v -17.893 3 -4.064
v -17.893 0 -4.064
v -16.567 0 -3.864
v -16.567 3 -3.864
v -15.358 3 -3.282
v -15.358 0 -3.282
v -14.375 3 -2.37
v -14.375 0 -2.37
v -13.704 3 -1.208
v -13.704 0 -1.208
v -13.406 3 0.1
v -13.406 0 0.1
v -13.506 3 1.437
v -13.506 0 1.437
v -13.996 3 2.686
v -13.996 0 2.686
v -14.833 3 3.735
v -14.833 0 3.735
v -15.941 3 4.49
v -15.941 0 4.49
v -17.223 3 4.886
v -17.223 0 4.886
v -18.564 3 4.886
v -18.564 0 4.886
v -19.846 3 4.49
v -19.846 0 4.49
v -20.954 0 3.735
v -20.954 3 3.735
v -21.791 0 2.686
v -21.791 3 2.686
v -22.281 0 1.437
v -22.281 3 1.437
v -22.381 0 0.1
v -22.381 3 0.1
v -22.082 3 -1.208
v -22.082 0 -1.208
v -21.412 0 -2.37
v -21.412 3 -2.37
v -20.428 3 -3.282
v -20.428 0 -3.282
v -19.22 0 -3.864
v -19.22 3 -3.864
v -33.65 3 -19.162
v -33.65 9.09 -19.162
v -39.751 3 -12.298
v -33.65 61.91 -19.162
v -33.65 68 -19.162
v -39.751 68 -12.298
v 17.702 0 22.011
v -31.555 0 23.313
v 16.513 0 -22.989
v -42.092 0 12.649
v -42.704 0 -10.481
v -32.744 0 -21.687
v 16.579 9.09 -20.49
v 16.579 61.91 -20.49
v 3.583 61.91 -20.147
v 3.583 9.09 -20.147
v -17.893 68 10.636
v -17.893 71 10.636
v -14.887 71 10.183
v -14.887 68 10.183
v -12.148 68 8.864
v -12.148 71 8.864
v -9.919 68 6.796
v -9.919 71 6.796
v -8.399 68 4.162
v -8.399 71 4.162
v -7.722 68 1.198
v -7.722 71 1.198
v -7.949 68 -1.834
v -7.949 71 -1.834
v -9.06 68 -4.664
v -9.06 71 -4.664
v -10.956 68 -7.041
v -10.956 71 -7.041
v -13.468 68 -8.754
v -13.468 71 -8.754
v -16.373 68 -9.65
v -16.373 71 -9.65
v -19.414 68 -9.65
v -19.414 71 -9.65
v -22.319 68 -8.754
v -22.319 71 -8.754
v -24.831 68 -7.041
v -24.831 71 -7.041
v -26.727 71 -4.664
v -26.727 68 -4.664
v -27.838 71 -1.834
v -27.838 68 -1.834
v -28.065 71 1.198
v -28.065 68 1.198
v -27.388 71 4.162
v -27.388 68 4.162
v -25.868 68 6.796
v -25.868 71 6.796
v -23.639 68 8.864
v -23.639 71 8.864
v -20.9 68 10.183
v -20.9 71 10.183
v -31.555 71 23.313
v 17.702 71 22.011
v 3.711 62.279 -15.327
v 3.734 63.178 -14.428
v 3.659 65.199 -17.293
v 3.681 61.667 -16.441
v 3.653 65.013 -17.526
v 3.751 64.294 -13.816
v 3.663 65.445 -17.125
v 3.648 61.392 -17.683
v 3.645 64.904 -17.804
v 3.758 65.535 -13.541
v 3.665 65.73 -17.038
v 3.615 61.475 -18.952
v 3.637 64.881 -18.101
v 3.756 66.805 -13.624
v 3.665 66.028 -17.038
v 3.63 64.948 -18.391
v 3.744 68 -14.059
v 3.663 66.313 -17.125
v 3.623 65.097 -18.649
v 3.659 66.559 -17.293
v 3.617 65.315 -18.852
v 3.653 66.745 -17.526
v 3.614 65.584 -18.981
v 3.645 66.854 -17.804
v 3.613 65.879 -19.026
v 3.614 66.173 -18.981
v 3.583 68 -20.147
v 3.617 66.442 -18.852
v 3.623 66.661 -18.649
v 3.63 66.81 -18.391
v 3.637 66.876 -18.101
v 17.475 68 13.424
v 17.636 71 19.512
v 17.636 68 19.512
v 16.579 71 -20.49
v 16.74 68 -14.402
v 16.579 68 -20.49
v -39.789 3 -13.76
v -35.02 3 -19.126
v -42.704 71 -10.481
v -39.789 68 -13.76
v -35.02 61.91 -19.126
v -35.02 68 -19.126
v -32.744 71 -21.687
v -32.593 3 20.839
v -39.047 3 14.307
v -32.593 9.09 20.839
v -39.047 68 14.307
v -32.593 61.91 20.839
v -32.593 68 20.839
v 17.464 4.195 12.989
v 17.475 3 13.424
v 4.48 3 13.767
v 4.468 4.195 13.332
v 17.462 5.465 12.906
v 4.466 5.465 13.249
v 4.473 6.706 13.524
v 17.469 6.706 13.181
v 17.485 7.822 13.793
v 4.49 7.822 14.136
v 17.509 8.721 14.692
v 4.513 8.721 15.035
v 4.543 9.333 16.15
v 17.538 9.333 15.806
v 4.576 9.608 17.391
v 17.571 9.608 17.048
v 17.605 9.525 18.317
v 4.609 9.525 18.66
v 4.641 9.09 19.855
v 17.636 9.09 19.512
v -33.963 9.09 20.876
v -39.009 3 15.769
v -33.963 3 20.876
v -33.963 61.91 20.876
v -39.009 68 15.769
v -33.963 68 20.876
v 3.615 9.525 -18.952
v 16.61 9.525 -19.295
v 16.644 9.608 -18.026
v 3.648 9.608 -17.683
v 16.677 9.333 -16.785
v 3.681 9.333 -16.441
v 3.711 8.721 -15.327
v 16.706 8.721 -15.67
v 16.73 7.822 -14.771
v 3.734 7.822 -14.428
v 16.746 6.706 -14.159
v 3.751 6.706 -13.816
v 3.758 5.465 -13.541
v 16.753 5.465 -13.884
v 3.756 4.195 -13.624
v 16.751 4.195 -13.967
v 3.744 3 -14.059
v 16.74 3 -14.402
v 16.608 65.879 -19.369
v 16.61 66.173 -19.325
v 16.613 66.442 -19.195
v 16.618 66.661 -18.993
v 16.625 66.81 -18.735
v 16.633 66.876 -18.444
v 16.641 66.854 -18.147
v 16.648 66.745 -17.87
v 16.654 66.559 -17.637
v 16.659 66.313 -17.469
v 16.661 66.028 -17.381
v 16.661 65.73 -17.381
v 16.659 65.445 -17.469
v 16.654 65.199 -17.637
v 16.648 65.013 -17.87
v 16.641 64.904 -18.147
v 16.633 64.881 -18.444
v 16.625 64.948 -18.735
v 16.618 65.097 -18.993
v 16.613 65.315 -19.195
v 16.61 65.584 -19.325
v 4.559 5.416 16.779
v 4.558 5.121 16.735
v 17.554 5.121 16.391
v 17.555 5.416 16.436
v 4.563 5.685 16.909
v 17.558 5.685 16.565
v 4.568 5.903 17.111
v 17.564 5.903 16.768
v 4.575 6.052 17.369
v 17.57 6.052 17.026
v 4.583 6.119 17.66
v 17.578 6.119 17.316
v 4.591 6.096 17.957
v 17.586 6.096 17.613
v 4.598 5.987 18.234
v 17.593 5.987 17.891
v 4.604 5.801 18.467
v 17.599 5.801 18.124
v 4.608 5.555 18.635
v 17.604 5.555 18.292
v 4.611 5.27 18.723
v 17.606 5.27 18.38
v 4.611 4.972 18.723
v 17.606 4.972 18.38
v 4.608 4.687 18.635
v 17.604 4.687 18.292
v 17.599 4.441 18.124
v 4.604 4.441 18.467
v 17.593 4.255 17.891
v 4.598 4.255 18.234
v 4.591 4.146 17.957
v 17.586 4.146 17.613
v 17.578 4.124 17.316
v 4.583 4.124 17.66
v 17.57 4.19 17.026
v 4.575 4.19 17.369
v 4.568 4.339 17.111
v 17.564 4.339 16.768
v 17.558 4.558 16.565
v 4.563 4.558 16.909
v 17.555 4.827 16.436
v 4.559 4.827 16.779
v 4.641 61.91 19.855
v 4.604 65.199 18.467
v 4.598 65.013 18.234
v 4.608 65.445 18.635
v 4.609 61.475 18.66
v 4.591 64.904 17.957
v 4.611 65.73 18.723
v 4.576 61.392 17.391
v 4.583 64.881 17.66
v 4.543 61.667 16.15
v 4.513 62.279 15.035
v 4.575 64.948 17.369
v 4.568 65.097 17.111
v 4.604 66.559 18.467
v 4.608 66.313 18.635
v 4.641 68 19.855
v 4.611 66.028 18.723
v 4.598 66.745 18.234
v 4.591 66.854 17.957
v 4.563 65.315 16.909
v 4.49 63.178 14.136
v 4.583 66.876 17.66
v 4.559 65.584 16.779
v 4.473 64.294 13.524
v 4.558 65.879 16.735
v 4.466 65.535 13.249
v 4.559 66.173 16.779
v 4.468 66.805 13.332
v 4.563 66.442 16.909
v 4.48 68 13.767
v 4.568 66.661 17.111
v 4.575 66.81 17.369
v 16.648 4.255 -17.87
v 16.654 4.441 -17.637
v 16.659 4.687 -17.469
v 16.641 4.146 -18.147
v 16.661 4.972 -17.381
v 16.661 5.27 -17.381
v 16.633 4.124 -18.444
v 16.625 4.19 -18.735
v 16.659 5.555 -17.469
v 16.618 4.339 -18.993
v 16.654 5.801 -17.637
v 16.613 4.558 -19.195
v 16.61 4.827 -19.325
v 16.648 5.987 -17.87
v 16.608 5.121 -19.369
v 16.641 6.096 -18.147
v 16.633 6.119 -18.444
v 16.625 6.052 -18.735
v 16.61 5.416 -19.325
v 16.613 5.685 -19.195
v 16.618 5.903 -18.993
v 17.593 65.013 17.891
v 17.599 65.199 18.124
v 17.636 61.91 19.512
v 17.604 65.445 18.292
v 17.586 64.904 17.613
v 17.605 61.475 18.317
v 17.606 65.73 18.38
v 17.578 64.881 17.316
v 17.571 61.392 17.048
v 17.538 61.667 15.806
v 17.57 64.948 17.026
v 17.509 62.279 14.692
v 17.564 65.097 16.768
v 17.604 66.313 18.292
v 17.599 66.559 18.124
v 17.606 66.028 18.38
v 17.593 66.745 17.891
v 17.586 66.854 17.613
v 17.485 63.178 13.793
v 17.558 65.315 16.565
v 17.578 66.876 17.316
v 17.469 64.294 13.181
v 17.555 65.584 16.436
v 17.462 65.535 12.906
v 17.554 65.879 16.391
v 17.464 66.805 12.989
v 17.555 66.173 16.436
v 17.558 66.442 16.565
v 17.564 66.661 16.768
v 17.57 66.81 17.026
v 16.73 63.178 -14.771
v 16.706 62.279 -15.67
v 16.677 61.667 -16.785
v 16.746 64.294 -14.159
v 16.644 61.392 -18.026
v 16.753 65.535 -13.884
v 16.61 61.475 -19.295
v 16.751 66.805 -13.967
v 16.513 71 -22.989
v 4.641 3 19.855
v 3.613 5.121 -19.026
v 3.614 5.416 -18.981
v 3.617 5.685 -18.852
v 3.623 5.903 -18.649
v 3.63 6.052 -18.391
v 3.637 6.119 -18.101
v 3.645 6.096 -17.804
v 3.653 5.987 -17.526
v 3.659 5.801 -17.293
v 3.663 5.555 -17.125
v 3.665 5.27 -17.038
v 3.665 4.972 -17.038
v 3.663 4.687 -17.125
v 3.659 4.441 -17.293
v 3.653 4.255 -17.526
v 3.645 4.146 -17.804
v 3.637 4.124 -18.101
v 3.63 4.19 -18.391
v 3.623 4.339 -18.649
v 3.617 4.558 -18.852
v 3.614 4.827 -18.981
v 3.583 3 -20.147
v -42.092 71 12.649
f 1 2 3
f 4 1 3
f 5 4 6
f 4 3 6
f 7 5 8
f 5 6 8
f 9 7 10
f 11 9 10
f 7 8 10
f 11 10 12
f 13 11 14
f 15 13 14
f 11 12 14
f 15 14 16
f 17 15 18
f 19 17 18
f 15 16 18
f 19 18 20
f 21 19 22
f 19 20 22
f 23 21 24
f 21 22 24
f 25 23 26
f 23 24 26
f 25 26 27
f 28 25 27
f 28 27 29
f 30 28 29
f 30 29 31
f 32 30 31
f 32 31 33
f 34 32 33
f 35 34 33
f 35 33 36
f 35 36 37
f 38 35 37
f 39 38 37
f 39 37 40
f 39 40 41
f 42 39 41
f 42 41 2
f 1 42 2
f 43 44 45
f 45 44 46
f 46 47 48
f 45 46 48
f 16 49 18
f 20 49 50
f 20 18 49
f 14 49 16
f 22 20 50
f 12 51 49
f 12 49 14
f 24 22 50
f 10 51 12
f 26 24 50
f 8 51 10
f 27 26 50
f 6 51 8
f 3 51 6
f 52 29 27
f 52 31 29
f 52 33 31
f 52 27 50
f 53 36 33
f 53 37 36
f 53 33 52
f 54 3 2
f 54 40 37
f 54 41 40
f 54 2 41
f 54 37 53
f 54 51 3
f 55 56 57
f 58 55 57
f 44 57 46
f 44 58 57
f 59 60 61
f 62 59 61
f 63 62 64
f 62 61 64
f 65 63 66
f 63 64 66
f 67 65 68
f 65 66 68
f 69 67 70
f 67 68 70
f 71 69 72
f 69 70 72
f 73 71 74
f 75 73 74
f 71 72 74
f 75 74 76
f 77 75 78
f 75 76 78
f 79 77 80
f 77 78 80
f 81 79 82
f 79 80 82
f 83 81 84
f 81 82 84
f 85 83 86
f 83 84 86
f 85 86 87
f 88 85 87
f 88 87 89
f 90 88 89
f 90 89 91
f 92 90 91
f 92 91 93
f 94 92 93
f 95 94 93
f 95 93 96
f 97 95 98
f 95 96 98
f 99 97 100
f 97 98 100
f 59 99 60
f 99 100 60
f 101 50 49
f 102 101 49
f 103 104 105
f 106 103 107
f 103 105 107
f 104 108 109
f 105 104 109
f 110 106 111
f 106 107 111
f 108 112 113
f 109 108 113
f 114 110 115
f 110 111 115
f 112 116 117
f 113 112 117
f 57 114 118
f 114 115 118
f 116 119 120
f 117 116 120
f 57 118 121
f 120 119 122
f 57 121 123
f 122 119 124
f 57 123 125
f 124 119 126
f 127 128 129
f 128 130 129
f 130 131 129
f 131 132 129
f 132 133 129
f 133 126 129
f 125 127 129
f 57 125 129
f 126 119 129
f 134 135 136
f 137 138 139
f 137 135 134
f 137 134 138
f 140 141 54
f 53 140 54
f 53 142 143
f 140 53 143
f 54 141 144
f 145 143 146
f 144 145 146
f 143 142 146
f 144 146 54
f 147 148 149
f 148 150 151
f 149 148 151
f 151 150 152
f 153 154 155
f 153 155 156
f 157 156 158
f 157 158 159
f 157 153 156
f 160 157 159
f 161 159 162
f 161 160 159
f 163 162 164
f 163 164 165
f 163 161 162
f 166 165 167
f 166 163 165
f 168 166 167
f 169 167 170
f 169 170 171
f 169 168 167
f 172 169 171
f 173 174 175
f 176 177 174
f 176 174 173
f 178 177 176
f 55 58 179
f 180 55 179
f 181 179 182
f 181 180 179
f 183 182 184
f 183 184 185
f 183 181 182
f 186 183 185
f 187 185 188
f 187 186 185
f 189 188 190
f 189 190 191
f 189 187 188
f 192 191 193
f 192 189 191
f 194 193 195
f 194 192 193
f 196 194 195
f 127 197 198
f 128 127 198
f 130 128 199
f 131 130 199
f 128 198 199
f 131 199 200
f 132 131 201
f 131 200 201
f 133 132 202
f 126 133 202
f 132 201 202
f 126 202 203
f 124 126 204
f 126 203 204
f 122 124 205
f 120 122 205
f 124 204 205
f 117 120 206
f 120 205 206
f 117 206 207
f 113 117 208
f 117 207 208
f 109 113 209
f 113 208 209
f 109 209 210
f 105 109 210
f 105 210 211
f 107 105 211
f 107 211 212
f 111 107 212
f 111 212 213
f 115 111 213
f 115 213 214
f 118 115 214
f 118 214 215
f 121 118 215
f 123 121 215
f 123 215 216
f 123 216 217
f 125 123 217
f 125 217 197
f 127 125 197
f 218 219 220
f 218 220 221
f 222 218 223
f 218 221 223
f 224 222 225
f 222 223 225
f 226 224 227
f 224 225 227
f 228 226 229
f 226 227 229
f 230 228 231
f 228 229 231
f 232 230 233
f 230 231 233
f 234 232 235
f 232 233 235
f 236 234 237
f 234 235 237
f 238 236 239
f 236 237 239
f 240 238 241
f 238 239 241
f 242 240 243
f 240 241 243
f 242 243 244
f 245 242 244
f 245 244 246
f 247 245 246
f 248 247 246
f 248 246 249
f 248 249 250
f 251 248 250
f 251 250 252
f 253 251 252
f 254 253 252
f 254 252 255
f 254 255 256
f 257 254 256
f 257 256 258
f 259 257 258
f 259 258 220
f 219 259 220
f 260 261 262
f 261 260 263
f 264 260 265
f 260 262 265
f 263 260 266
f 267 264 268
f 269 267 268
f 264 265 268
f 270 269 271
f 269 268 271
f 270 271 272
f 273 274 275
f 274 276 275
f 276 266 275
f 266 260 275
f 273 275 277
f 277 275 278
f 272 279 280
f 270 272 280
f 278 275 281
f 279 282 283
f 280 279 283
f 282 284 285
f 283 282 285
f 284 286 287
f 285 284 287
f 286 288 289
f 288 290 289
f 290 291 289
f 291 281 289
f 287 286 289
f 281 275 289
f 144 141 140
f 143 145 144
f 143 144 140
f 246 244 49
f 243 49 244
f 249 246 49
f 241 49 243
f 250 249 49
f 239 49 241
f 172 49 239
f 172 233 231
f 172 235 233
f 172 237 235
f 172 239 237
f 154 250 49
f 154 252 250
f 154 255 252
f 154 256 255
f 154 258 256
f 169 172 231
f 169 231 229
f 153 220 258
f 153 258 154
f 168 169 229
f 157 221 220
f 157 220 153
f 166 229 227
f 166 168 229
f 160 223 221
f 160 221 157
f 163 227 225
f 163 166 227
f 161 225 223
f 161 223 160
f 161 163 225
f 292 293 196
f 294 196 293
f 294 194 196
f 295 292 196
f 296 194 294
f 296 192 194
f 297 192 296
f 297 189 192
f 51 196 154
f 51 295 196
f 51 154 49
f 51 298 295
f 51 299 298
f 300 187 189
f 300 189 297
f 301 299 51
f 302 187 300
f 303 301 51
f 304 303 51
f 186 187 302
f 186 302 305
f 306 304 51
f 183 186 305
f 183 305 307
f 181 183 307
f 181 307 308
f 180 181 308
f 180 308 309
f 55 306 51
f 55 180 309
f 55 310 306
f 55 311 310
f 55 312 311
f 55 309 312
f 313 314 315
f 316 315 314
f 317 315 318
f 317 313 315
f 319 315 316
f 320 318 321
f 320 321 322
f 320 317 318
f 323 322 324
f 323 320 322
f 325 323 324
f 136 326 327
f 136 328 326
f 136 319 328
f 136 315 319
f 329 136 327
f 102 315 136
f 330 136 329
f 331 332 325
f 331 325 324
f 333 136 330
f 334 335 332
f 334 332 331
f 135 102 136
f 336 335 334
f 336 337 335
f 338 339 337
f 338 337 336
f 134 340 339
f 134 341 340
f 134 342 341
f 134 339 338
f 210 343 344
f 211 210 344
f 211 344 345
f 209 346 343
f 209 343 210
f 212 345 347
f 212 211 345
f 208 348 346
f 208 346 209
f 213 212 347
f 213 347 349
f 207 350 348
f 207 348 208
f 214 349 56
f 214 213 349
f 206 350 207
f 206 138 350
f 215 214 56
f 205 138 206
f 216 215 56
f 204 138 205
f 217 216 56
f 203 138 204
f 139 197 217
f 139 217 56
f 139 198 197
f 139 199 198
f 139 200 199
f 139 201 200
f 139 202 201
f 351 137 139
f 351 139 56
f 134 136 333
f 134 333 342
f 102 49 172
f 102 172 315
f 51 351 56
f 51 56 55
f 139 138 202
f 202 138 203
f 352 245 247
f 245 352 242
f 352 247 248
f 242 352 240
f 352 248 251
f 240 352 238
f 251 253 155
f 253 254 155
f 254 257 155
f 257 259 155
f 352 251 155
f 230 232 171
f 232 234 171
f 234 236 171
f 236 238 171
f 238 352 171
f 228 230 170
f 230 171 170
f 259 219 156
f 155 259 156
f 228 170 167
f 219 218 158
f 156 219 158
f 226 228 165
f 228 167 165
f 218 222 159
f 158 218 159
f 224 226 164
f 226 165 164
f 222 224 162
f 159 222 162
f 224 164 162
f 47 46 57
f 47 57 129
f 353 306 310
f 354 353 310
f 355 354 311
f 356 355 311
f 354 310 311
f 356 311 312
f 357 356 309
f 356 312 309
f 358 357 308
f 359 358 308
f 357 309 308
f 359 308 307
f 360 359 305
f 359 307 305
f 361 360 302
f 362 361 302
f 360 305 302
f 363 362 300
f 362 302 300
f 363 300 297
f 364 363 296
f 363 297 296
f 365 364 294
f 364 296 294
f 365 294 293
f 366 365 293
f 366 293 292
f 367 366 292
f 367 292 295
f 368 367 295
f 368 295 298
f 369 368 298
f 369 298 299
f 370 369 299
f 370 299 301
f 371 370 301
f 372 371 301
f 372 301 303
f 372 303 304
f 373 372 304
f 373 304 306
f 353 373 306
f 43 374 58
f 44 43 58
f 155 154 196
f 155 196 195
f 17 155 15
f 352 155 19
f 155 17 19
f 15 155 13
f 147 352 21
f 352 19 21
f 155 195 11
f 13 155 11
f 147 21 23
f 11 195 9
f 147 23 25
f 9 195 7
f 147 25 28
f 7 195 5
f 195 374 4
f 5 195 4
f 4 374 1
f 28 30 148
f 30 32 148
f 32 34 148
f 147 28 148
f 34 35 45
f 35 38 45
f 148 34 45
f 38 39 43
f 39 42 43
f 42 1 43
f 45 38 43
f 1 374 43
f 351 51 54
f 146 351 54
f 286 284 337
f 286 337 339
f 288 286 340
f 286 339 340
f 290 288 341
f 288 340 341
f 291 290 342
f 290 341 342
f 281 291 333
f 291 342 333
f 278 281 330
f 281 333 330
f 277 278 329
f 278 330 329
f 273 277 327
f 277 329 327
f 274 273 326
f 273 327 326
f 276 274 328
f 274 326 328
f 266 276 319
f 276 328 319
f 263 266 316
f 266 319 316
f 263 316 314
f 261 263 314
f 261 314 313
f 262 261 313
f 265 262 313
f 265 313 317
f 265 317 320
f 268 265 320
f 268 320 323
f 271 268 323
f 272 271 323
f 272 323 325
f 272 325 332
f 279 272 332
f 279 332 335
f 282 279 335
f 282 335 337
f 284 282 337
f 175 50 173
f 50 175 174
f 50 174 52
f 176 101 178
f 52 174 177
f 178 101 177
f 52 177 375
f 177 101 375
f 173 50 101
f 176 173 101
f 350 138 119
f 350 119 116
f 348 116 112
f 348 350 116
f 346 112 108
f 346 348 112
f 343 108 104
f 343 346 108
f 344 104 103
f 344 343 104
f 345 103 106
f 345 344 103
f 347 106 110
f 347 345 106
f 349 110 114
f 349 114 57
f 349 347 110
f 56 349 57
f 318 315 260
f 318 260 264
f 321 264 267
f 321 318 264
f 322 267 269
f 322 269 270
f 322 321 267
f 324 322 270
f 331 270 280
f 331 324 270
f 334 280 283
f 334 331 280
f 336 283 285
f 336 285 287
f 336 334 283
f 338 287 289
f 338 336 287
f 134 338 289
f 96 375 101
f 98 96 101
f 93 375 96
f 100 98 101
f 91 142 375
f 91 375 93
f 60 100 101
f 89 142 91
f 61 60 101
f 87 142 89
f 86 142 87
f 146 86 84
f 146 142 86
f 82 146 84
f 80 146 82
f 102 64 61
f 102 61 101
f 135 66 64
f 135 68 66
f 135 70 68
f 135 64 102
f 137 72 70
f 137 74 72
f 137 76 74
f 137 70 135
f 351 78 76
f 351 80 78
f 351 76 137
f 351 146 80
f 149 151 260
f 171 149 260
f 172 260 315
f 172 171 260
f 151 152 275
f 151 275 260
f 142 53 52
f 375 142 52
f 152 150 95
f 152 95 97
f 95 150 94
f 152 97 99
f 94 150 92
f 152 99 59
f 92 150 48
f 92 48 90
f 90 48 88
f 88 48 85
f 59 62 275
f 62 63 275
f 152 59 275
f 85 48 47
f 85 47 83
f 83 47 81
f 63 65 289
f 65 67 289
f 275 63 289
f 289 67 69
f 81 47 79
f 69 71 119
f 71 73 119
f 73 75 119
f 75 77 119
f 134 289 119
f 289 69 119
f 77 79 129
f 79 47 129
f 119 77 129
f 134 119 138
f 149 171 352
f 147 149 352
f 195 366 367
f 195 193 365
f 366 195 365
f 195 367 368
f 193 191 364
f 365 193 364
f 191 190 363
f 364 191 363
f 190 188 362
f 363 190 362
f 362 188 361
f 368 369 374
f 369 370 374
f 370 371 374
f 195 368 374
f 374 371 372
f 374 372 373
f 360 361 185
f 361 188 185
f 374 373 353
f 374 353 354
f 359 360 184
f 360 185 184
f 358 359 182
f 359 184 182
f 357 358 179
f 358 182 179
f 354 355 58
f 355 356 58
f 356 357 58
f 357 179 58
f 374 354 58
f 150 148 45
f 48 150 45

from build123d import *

# Parameters (mm, degrees)
SKETCH1_R                        = 4.951729289
BOSS_EXTRUDE3_DEPTH              = 3
BOSS_EXTRUDE4_DEPTH              = 68
SKETCH5_R                        = 4.5
CUT_EXTRUDE1_DEPTH               = 68
SKETCH11_W                       = 45.01572081
SKETCH11_H                       = 71
CUT_EXTRUDE3_DEPTH               = 2.5
SKETCH12_R                       = 13
BOSS_EXTRUDE7_DEPTH              = 3
SKETCH13_W                       = 45.01572081
SKETCH13_H                       = 71
CUT_EXTRUDE4_DEPTH               = 13
SKETCH14_W                       = 45.01572081
SKETCH14_H                       = 71
BOSS_EXTRUDE8_DEPTH              = 3
SKETCH15_R                       = 1.5
BOSS_EXTRUDE11_DEPTH             = 56.52620135
SKETCH16_R                       = 9
SKETCH16_R_2                     = 4.15
BOSS_EXTRUDE12_DEPTH             = 2
BOSS_EXTRUDE12_DIRECTION_2_REACH = 85.837
SKETCH17_R                       = 9
SKETCH17_R_2                     = 1
BOSS_EXTRUDE13_DEPTH             = 2
SKETCH18_R                       = 13
SKETCH18_R_2                     = 1
BOSS_EXTRUDE14_DEPTH             = 3
SKETCH19_R                       = 1.5
SKETCH19_R_2                     = 1
BOSS_EXTRUDE15_DEPTH             = 56.52620135
CUT_EXTRUDE9_DEPTH               = 43.52620135
SKETCH27_R                       = 10
SKETCH27_R_2                     = 1
CUT_EXTRUDE12_DEPTH              = 10
SKETCH28_R                       = 4.15
CUT_EXTRUDE13_DEPTH              = 73
SKETCH29_R                       = 4.5
SKETCH29_R_2                     = 4.15
CUT_EXTRUDE14_DEPTH              = 73
SKETCH30_R                       = 9
CUT_EXTRUDE15_DEPTH              = 4
SKETCH31_R                       = 10.2
CUT_EXTRUDE17_DEPTH              = 3
CUT_EXTRUDE18_DEPTH              = 197
SKETCH33_W                       = 14.992341928
SKETCH33_H                       = 71
BOSS_EXTRUDE16_DEPTH             = 1
SKETCH34_W                       = 14.992341928
SKETCH34_H                       = 71
BOSS_EXTRUDE17_DEPTH             = 1


with BuildPart() as part:
    # Sketch1 → Boss-Extrude3 (new body)
    with BuildSketch(Plane(origin=(0, 0, 0), x_dir=(1, 0, 0), z_dir=(0, 1, 0))):
        Polygon((-55.988214466, 21.072670098), (19.011785534, 23.055317054), (20.201373708, -21.944682946), (-54.798626292, -23.927329902), align=None)
        with Locations(Location((-17.893420379, -0.436006424, 0), (0, 0, 270))):
            Circle(SKETCH1_R, mode=Mode.SUBTRACT)
    extrude(amount=BOSS_EXTRUDE3_DEPTH)

    # Sketch4 → Boss-Extrude4 (add)
    with BuildSketch(Plane(origin=(0, 3, 0), x_dir=(1, 0, 0), z_dir=(0, 1, 0))):
        Polygon((-54.798626292, -23.927329902), (20.201373708, -21.944682946), (19.011785534, 23.055317054), (-55.988214466, 21.072670098), align=None)
        Polygon((-52.365564518, -21.362137824), (17.636181629, -19.511621172), (16.578723759, 20.490124975), (-53.423022387, 18.639608323), align=None, mode=Mode.SUBTRACT)
    extrude(amount=BOSS_EXTRUDE4_DEPTH)

    # Sketch5 → Cut-Extrude1 (cut)
    with BuildSketch(Plane(origin=(19.607557344, 0, -0.518331518), x_dir=(-0.026426060768931774, 0, -0.9996507706755579), z_dir=(0.999650770675558, 0, -0.026426060768931777))):
        with Locations((0.036998456, 35.5)):
            Circle(SKETCH5_R)
        with BuildLine():
            ThreePointArc((-17.463001544, 29.25), (-19.213001544, 27.5), (-17.463001544, 25.75))
            ThreePointArc((-17.463001544, 25.75), (-15.713001544, 27.5), (-17.463001544, 29.25))
        make_face()
        with BuildLine():
            ThreePointArc((17.536998456, 25.75), (19.286998456, 27.5), (17.536998456, 29.25))
            ThreePointArc((17.536998456, 29.25), (15.786998456, 27.5), (17.536998456, 25.75))
        make_face()
    extrude(amount=-CUT_EXTRUDE1_DEPTH, mode=Mode.SUBTRACT)

    # Sketch11 → Cut-Extrude3 (cut)
    with BuildSketch(Plane(origin=(19.607557344, 0, -0.518331518), x_dir=(-0.026426060768931756, 0, -0.9996507706755579), z_dir=(0.999650770675558, 0, -0.02642606076893176))):
        with Locations((0.036998456, 35.5)):
            Rectangle(SKETCH11_W, SKETCH11_H)
    extrude(amount=-CUT_EXTRUDE3_DEPTH, mode=Mode.SUBTRACT)

    # Sketch12 → Boss-Extrude7 (add)
    with BuildSketch(Plane(origin=(0, 71, 0), x_dir=(1, 0, 0), z_dir=(0, 1, 0))):
        Polygon((17.636181629, -19.511621172), (16.578723759, 20.490124975), (-53.423022387, 18.639608323), (-52.365564518, -21.362137824), align=None)
        with Locations(Location((-17.893420379, -0.436006424, 0), (0, 0, 270))):
            Circle(SKETCH12_R, mode=Mode.SUBTRACT)
    extrude(amount=-BOSS_EXTRUDE7_DEPTH)

    # Sketch13 → Cut-Extrude4 (cut)
    with BuildSketch(Plane(origin=(-55.392442656, 0, 1.464315438), x_dir=(0.02642606076893168, 0, 0.9996507706755579), z_dir=(-0.999650770675558, 0, 0.026426060768931683))):
        with Locations((-0.036998456, 35.5)):
            Rectangle(SKETCH13_W, SKETCH13_H)
    extrude(amount=-CUT_EXTRUDE4_DEPTH, mode=Mode.SUBTRACT)

    # Sketch14 → Boss-Extrude8 (add)
    with BuildSketch(Plane(origin=(-42.396982637, 0, 1.120776648), x_dir=(0.026426060768931694, 0, 0.9996507706755579), z_dir=(-0.999650770675558, 0, 0.026426060768931697))):
        with Locations((-0.036998456, 35.5)):
            Rectangle(SKETCH14_W, SKETCH14_H)
    extrude(amount=-BOSS_EXTRUDE8_DEPTH)

    # Sketch15 → Boss-Extrude11 (add)
    with BuildSketch(Plane(origin=(17.108430418, 0, -0.452266367), x_dir=(-0.02642606076893177, 0, -0.9996507706755579), z_dir=(0.999650770675558, 0, -0.026426060768931774))):
        with BuildLine():
            ThreePointArc((20.044858861, 9.08994731), (14.741558002, 8.303300859), (13.954911551, 3))
            Line((13.954911551, 3), (20.044858861, 3))
            Line((20.044858861, 3), (20.044858861, 9.08994731))
        make_face()
        with Locations((17.923538517, 5.121320344)):
            Circle(SKETCH15_R, mode=Mode.SUBTRACT)
        with BuildLine():
            Line((-19.970861949, 9.08994731), (-19.970861949, 3))
            Line((-19.970861949, 3), (-13.880914639, 3))
            ThreePointArc((-13.880914639, 3), (-14.66756109, 8.303300859), (-19.970861949, 9.08994731))
        make_face()
        with Locations((-17.849541605, 5.121320344)):
            Circle(SKETCH15_R, mode=Mode.SUBTRACT)
        with BuildLine():
            Line((20.044858861, 68), (13.954911551, 68))
            ThreePointArc((13.954911551, 68), (14.741558002, 62.696699141), (20.044858861, 61.91005269))
            Line((20.044858861, 61.91005269), (20.044858861, 68))
        make_face()
        with Locations((17.923538517, 65.878679656)):
            Circle(SKETCH15_R, mode=Mode.SUBTRACT)
        with BuildLine():
            Line((-19.970861949, 68), (-19.970861949, 61.91005269))
            ThreePointArc((-19.970861949, 61.91005269), (-14.66756109, 62.696699141), (-13.880914639, 68))
            Line((-13.880914639, 68), (-19.970861949, 68))
        make_face()
        with Locations((-17.849541605, 65.878679656)):
            Circle(SKETCH15_R, mode=Mode.SUBTRACT)
    extrude(amount=-BOSS_EXTRUDE11_DEPTH)

    # Sketch16 → Boss-Extrude12 (add)
    with BuildSketch(Plane(origin=(0, 3, 0), x_dir=(1, 0, 0), z_dir=(0, 1, 0))):
        with Locations(Location((-17.893420379, -0.436006424, 0), (0, 0, 270))):
            Circle(SKETCH16_R)
        with Locations(Location((-17.893420379, -0.436006424, 0), (0, 0, 270))):
            Circle(SKETCH16_R_2, mode=Mode.SUBTRACT)
    extrude(amount=BOSS_EXTRUDE12_DEPTH)

    # Boss-Extrude12 direction 2: up to this face of the body (flat: up to its plane)
    boss_extrude12_direction_2_end = Plane(part.part.faces().sort_by_distance((-12.489919849, 0, 0.293163306))[0])
    # Sketch16 → Boss-Extrude12 direction 2 (add, up to the picked face)
    with BuildSketch(Plane(origin=(0, 3, 0), x_dir=(1, 0, 0), z_dir=(0, 1, 0)), mode=Mode.PRIVATE) as boss_extrude12_direction_2_sk1:
        with Locations(Location((-17.893420379, -0.436006424, 0), (0, 0, 270))):
            Circle(SKETCH16_R)
        with Locations(Location((-17.893420379, -0.436006424, 0), (0, 0, 270))):
            Circle(SKETCH16_R_2, mode=Mode.SUBTRACT)
    boss_extrude12_direction_2_tool1 = split(extrude(boss_extrude12_direction_2_sk1.sketch, amount=-BOSS_EXTRUDE12_DIRECTION_2_REACH, mode=Mode.PRIVATE), bisect_by=boss_extrude12_direction_2_end, keep=Keep.BOTH, mode=Mode.PRIVATE)
    add(boss_extrude12_direction_2_tool1.solids().sort_by(Axis((-17.89342, 3, -8.309435), (0, -1, 0)))[0])

    # Sketch17 → Boss-Extrude13 (add)
    with BuildSketch(Plane(origin=(0, 5, 0), x_dir=(1, 0, 0), z_dir=(0, 1, 0))):
        with Locations(Location((-17.893420379, -0.436006424, 0), (0, 0, 270))):
            Circle(SKETCH17_R)
        with Locations(Location((-17.893420379, -0.436006424, 0), (0, 0, 270))):
            Circle(SKETCH17_R_2, mode=Mode.SUBTRACT)
    extrude(amount=BOSS_EXTRUDE13_DEPTH)

    # Sketch18 → Boss-Extrude14 (add)
    with BuildSketch(Plane(origin=(0, 71, 0), x_dir=(1, 0, 0), z_dir=(0, 1, 0))):
        with Locations((-17.893420379, -0.436006424)):
            Circle(SKETCH18_R)
        with Locations(Location((-17.893420379, -0.436006424, 0), (0, 0, 270))):
            Circle(SKETCH18_R_2, mode=Mode.SUBTRACT)
    extrude(amount=-BOSS_EXTRUDE14_DEPTH)

    # Sketch19 → Boss-Extrude15 (add)
    with BuildSketch(Plane(origin=(17.108430418, 0, -0.452266367), x_dir=(-0.02642606076893177, 0, -0.9996507706755579), z_dir=(0.999650770675558, 0, -0.026426060768931774))):
        with Locations((-17.849541605, 5.121320344)):
            Circle(SKETCH19_R)
        with Locations((-17.849541605, 5.121320344)):
            Circle(SKETCH19_R_2, mode=Mode.SUBTRACT)
        with Locations((17.923538517, 5.121320344)):
            Circle(SKETCH19_R)
        with Locations((17.923538517, 5.121320344)):
            Circle(SKETCH19_R_2, mode=Mode.SUBTRACT)
        with Locations((-17.849541605, 65.878679656)):
            Circle(SKETCH19_R)
        with Locations((-17.849541605, 65.878679656)):
            Circle(SKETCH19_R_2, mode=Mode.SUBTRACT)
        with Locations((17.923538517, 65.878679656)):
            Circle(SKETCH19_R)
        with Locations((17.923538517, 65.878679656)):
            Circle(SKETCH19_R_2, mode=Mode.SUBTRACT)
    extrude(amount=-BOSS_EXTRUDE15_DEPTH)

    # Sketch23 → Cut-Extrude9 (cut)
    with BuildSketch(Plane(origin=(4.112970399, 0, -0.108727577), x_dir=(-0.02642606076893177, 0, -0.9996507706755579), z_dir=(0.999650770675558, 0, -0.026426060768931774))):
        Polygon((-19.970861949, 68), (-19.970861949, 9.08994731), (-19.970861949, 3), (-13.880914639, 3), (-8.963001544, 3), (-8.963001544, 7), (9.036998456, 7), (9.036998456, 3), (20.044858861, 3), (20.044858861, 9.08994731), (20.044858861, 68), (-13.880914639, 68), align=None)
    extrude(amount=-CUT_EXTRUDE9_DEPTH, mode=Mode.SUBTRACT)

    # Sketch27 → Cut-Extrude12 (cut)
    with BuildSketch(Plane(origin=(0, 71, 0), x_dir=(1, 0, 0), z_dir=(0, 1, 0))):
        with Locations(Location((-17.893420379, -0.436006424, 0), (0, 0, 270))):
            Circle(SKETCH27_R)
        with Locations(Location((-17.893420379, -0.436006424, 0), (0, 0, 270))):
            Circle(SKETCH27_R_2, mode=Mode.SUBTRACT)
    extrude(amount=-CUT_EXTRUDE12_DEPTH, mode=Mode.SUBTRACT)

    # Sketch28 → Cut-Extrude13 (cut)
    with BuildSketch(Plane.XZ):
        with Locations(Location((-17.893420379, 0.436006424, 0), (0, 0, 90))):
            Circle(SKETCH28_R)
    extrude(amount=-CUT_EXTRUDE13_DEPTH, mode=Mode.SUBTRACT)

    # Sketch29 → Cut-Extrude14 (cut)
    with BuildSketch(Plane.XZ):
        with Locations(Location((-17.893420379, 0.436006424, 0), (0, 0, 270))):
            Circle(SKETCH29_R)
        with Locations((-17.893420379, 0.436006424)):
            Circle(SKETCH29_R_2, mode=Mode.SUBTRACT)
    extrude(amount=-CUT_EXTRUDE14_DEPTH, mode=Mode.SUBTRACT)

    # Sketch30 → Cut-Extrude15 (cut)
    with BuildSketch(Plane(origin=(0, 7, 0), x_dir=(1, 0, 0), z_dir=(0, 1, 0))):
        with Locations((-17.893420379, -0.436006424)):
            Circle(SKETCH30_R)
    extrude(amount=-CUT_EXTRUDE15_DEPTH, mode=Mode.SUBTRACT)

    # Sketch31 → Cut-Extrude17 (cut)
    with BuildSketch(Plane(origin=(0, 71, 0), x_dir=(1, 0, 0), z_dir=(0, 1, 0))):
        with Locations(Location((-17.893420379, -0.436006424, 0), (0, 0, 270))):
            Circle(SKETCH31_R)
    extrude(amount=-CUT_EXTRUDE17_DEPTH, mode=Mode.SUBTRACT)

    # Sketch32 → Cut-Extrude18 (cut)
    with BuildSketch(Plane(origin=(0, 71, 0), x_dir=(1, 0, 0), z_dir=(0, 1, 0))):
        Polygon((-42.992754447, 21.416208888), (-42.703678037, 10.480963623), (-32.74415639, 21.687133577), align=None)
        Polygon((-31.554568217, -23.312866423), (-42.092242683, -12.648545848), (-41.803166274, -23.583791112), align=None)
    extrude(amount=-CUT_EXTRUDE18_DEPTH, mode=Mode.SUBTRACT)

    # Sketch33 → Boss-Extrude16 (add)
    with BuildSketch(Plane(origin=(-27.621364057, 0, 27.293341448), x_dir=(0.7028704732937463, 0, 0.7113178598712571), z_dir=(-0.7113178598712571, 0, 0.7028704732937463))):
        with Locations((-13.09208701, 35.5)):
            Rectangle(SKETCH33_W, SKETCH33_H)
    extrude(amount=-BOSS_EXTRUDE16_DEPTH)

    # Sketch34 → Boss-Extrude17 (add)
    with BuildSketch(Plane(origin=(-29.062615571, 0, -25.829498399), x_dir=(-0.6643072639922937, 0, 0.7474596035954538), z_dir=(-0.7474596035954538, 0, -0.6643072639922937))):
        with Locations((13.038095641, 35.5)):
            Rectangle(SKETCH34_W, SKETCH34_H)
    extrude(amount=-BOSS_EXTRUDE17_DEPTH)


solid = part.part
